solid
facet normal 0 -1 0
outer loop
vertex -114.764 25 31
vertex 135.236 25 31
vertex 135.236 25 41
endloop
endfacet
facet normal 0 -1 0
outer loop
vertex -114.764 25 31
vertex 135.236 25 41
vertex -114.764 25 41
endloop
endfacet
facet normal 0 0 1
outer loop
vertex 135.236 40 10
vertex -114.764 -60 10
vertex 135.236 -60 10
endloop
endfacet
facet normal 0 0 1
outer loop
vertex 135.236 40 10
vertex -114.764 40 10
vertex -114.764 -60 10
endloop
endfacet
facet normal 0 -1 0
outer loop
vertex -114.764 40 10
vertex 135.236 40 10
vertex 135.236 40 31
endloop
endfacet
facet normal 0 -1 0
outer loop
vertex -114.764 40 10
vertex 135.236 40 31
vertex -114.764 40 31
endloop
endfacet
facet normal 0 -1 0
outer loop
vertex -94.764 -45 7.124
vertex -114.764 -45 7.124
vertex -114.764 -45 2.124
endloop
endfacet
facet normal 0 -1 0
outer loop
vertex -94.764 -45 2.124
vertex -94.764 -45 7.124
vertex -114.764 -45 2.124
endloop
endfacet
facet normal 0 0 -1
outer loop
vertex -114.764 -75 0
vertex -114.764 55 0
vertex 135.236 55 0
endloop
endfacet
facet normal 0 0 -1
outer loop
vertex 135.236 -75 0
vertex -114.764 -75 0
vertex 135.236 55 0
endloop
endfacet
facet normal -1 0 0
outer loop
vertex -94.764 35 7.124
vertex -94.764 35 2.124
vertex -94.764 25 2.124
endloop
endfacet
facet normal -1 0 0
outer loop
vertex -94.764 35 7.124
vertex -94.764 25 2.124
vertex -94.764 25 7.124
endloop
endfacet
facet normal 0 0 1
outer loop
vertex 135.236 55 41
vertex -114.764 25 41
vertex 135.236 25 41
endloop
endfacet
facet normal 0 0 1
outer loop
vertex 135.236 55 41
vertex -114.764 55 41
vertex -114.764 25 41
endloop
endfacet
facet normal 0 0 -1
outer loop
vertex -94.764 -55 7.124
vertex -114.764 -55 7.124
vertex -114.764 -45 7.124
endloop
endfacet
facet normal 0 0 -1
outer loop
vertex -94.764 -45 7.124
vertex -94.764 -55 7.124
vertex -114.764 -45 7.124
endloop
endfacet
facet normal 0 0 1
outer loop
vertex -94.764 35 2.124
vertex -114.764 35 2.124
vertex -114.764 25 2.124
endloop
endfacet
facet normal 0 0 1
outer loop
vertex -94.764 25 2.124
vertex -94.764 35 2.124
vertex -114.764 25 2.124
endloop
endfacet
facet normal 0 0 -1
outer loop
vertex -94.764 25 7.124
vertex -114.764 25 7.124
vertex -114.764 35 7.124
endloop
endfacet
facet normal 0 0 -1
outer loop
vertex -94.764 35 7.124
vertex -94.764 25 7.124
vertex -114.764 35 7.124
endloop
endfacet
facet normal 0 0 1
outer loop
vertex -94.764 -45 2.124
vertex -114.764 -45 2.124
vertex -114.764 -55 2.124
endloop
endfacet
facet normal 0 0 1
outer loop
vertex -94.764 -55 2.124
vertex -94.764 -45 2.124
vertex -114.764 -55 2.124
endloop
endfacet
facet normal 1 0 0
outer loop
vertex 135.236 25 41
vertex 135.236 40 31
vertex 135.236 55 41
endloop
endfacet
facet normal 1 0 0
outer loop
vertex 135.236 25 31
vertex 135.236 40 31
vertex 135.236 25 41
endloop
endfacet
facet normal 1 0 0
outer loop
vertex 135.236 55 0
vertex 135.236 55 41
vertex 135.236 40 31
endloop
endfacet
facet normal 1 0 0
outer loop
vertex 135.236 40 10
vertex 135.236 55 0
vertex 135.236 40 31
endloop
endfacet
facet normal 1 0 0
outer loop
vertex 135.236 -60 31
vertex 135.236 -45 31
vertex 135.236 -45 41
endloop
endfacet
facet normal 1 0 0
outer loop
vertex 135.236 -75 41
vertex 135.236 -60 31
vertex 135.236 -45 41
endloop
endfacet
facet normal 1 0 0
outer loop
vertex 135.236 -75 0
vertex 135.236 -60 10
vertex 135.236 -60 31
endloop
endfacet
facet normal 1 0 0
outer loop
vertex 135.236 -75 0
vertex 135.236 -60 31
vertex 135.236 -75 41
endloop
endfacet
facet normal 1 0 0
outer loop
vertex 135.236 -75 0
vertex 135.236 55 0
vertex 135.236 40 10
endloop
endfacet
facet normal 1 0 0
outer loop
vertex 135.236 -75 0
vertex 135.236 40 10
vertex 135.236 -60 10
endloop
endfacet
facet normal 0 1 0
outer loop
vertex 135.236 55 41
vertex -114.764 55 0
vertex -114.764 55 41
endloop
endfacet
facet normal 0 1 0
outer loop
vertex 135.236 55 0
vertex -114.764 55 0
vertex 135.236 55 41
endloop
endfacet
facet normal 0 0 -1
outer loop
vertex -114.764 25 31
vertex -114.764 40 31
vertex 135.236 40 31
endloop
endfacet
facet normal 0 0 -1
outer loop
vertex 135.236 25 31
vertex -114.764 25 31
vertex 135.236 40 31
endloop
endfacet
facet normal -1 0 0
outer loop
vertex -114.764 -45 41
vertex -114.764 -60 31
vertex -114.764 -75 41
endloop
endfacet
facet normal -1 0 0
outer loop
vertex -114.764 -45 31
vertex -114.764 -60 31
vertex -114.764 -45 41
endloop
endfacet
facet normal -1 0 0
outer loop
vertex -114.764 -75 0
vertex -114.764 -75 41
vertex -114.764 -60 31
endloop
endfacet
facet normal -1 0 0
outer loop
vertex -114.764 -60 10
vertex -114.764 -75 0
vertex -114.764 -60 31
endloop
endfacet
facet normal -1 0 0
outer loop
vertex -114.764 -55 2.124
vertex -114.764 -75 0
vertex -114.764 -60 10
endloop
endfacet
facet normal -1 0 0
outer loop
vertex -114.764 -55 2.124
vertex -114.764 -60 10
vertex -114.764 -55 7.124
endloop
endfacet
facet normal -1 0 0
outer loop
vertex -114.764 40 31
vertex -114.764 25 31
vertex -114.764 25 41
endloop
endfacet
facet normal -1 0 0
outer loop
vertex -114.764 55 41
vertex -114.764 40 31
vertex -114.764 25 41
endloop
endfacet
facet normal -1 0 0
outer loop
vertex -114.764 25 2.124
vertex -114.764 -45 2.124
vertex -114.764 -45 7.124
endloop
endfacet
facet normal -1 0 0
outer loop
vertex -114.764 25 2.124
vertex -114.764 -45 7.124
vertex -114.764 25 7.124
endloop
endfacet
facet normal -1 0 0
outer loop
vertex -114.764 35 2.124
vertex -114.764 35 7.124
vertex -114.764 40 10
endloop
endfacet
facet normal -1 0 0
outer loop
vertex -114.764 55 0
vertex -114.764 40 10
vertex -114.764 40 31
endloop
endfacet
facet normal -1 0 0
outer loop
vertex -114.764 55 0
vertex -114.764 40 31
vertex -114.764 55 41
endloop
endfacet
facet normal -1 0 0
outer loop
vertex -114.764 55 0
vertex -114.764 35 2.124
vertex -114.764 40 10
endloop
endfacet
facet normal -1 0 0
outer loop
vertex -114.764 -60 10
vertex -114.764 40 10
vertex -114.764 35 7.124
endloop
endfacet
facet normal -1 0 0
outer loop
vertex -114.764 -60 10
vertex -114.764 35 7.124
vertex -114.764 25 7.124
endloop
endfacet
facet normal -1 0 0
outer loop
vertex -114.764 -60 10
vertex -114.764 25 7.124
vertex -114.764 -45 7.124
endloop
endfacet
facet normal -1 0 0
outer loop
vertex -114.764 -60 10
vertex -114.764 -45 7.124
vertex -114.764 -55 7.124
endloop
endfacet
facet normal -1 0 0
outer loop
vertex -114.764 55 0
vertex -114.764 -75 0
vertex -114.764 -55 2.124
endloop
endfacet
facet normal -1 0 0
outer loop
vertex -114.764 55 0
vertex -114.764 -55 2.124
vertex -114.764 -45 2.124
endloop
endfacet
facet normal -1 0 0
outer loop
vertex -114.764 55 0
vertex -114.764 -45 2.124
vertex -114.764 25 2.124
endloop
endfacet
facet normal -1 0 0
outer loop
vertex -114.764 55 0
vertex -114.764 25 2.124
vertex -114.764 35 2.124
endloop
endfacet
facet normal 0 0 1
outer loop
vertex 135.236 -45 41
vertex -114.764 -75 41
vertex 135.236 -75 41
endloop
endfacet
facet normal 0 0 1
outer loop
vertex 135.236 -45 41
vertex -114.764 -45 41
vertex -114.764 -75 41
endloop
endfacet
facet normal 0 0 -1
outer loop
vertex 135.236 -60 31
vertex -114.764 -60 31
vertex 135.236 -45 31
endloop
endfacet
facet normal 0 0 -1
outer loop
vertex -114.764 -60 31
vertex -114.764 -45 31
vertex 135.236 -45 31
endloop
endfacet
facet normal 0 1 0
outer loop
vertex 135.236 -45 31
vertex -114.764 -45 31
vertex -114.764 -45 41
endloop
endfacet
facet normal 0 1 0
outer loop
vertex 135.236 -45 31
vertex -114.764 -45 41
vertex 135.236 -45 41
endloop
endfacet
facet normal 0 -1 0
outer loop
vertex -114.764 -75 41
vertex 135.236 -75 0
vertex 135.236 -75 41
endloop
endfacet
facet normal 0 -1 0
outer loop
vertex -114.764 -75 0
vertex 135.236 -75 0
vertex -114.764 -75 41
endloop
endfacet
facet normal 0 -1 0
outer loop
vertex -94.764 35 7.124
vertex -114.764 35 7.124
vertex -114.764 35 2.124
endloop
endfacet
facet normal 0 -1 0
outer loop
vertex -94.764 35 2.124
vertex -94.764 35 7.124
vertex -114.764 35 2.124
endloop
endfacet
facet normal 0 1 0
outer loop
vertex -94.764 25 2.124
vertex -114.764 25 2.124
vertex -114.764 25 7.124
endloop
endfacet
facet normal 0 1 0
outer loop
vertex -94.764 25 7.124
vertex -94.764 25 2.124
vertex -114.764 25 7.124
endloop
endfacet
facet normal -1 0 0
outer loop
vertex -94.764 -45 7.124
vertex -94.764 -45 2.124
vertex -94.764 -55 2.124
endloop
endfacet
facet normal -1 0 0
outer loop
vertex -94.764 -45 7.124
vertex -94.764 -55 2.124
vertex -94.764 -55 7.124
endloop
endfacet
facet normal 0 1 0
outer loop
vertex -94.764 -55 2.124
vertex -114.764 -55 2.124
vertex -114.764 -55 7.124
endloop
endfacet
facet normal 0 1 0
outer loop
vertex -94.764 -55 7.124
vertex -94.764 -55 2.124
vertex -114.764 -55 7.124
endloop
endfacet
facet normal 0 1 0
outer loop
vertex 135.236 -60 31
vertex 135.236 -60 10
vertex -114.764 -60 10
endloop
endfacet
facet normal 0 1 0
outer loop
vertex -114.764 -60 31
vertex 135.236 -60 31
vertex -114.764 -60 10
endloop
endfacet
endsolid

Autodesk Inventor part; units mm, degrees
ref_plane "YZ Plane" through (0, 0, 0) normal (1, 0, 0) x (0, 1, 0)
ref_plane "XZ Plane" through (0, 0, 0) normal (0, 1, 0) x (-1, 0, 0)
ref_plane "XY Plane" through (0, 0, 0) normal (0, 0, 1) x (1, 0, 0)
sketch "Sketch1" plane through (0, 0, 0) normal (0, 0, 1) x (1, 0, 0)
  line L0 (-114.7642, 55) -> (135.2358, 55)
  line L1 (135.2358, 55) -> (135.2358, -75)
  line L2 (135.2358, -75) -> (-114.7642, -75)
  line L3 (-114.7642, -75) -> (-114.7642, 55)
  point P0 (0, 0)
  dimension "d0" = 250
  dimension "d1" = 130
extrude "Extrusion1" add sketch "Sketch1" along normal blind 10
sketch "Sketch2" plane through (0, 0, 10) normal (0, 0, 1) x (1, 0, 0)
  line L0 (135.2358, 55) -> (-114.7642, 55) projected
  line L1 (135.2358, -75) -> (135.2358, 55) projected
  line L2 (-114.7642, 55) -> (135.2358, 55)
  line L3 (135.2358, 55) -> (135.2358, 40)
  line L4 (135.2358, 40) -> (-114.7642, 40)
  line L5 (-114.7642, 40) -> (-114.7642, 55)
  line L6 (-114.7642, -75) -> (135.2358, -75)
  line L7 (135.2358, -75) -> (135.2358, -60)
  line L8 (135.2358, -60) -> (-114.7642, -60)
  line L9 (-114.7642, -60) -> (-114.7642, -75)
  point P0 (0, 0)
  dimension "d4" = 15
  dimension "d5" = 15
extrude "Extrusion2" add sketch "Sketch2" along normal blind 21
sketch "Sketch3" plane through (0, 0, 31) normal (0, 0, 1) x (1, 0, 0)
  line L0 (-114.7642, 55) -> (-114.7642, -75) projected
  line L1 (135.2358, -60) -> (135.2358, 40) projected
  line L2 (-114.7642, 55) -> (135.2358, 55)
  line L3 (135.2358, 55) -> (135.2358, 25)
  line L4 (135.2358, 25) -> (-114.7642, 25)
  line L5 (-114.7642, 25) -> (-114.7642, 55)
  line L6 (135.2358, -75) -> (135.2358, -60) projected
  line L7 (135.2358, -75) -> (-114.7642, -75)
  line L8 (-114.7642, -75) -> (-114.7642, -45)
  line L9 (-114.7642, -45) -> (135.2358, -45)
  line L10 (135.2358, -45) -> (135.2358, -75)
  point P0 (0, 0)
  point P1 (-114.7642, -45)
  dimension "d8" = 30
  dimension "d9" = 30
extrude "Extrusion3" add sketch "Sketch3" along normal blind 10 contours L2 L3 L1 L4 L0 | L9 L1 L6 L7 L0
sketch "Sketch4" plane through (-114.7642, -75, 0) normal (-1, 0, 0) x (0, 0, 1)
  line L0 (7.1242, 110) -> (2.1242, 110)
  line L1 (2.1242, 110) -> (2.1242, 100)
  line L2 (2.1242, 100) -> (7.1242, 100)
  line L3 (7.1242, 100) -> (7.1242, 110)
  line L4 (7.1242, 30) -> (2.1242, 30)
  line L5 (2.1242, 30) -> (2.1242, 20)
  line L6 (2.1242, 20) -> (7.1242, 20)
  line L7 (7.1242, 20) -> (7.1242, 30)
  line L8 (31, 100) -> (41, 100) projected
  line L9 (31, 30) -> (41, 30) projected
  point P0 (0, 75)
  dimension "d12" = 5
  dimension "d13" = 10
  dimension "d14" = 10
  dimension "d15" = 0
  dimension "d16" = 0
extrude "Extrusion4" cut sketch "Sketch4" against normal blind 20
equation "\"d5\" = d4"
equation "\"d9\" = d8"
properties part number "Part1_with_things"
